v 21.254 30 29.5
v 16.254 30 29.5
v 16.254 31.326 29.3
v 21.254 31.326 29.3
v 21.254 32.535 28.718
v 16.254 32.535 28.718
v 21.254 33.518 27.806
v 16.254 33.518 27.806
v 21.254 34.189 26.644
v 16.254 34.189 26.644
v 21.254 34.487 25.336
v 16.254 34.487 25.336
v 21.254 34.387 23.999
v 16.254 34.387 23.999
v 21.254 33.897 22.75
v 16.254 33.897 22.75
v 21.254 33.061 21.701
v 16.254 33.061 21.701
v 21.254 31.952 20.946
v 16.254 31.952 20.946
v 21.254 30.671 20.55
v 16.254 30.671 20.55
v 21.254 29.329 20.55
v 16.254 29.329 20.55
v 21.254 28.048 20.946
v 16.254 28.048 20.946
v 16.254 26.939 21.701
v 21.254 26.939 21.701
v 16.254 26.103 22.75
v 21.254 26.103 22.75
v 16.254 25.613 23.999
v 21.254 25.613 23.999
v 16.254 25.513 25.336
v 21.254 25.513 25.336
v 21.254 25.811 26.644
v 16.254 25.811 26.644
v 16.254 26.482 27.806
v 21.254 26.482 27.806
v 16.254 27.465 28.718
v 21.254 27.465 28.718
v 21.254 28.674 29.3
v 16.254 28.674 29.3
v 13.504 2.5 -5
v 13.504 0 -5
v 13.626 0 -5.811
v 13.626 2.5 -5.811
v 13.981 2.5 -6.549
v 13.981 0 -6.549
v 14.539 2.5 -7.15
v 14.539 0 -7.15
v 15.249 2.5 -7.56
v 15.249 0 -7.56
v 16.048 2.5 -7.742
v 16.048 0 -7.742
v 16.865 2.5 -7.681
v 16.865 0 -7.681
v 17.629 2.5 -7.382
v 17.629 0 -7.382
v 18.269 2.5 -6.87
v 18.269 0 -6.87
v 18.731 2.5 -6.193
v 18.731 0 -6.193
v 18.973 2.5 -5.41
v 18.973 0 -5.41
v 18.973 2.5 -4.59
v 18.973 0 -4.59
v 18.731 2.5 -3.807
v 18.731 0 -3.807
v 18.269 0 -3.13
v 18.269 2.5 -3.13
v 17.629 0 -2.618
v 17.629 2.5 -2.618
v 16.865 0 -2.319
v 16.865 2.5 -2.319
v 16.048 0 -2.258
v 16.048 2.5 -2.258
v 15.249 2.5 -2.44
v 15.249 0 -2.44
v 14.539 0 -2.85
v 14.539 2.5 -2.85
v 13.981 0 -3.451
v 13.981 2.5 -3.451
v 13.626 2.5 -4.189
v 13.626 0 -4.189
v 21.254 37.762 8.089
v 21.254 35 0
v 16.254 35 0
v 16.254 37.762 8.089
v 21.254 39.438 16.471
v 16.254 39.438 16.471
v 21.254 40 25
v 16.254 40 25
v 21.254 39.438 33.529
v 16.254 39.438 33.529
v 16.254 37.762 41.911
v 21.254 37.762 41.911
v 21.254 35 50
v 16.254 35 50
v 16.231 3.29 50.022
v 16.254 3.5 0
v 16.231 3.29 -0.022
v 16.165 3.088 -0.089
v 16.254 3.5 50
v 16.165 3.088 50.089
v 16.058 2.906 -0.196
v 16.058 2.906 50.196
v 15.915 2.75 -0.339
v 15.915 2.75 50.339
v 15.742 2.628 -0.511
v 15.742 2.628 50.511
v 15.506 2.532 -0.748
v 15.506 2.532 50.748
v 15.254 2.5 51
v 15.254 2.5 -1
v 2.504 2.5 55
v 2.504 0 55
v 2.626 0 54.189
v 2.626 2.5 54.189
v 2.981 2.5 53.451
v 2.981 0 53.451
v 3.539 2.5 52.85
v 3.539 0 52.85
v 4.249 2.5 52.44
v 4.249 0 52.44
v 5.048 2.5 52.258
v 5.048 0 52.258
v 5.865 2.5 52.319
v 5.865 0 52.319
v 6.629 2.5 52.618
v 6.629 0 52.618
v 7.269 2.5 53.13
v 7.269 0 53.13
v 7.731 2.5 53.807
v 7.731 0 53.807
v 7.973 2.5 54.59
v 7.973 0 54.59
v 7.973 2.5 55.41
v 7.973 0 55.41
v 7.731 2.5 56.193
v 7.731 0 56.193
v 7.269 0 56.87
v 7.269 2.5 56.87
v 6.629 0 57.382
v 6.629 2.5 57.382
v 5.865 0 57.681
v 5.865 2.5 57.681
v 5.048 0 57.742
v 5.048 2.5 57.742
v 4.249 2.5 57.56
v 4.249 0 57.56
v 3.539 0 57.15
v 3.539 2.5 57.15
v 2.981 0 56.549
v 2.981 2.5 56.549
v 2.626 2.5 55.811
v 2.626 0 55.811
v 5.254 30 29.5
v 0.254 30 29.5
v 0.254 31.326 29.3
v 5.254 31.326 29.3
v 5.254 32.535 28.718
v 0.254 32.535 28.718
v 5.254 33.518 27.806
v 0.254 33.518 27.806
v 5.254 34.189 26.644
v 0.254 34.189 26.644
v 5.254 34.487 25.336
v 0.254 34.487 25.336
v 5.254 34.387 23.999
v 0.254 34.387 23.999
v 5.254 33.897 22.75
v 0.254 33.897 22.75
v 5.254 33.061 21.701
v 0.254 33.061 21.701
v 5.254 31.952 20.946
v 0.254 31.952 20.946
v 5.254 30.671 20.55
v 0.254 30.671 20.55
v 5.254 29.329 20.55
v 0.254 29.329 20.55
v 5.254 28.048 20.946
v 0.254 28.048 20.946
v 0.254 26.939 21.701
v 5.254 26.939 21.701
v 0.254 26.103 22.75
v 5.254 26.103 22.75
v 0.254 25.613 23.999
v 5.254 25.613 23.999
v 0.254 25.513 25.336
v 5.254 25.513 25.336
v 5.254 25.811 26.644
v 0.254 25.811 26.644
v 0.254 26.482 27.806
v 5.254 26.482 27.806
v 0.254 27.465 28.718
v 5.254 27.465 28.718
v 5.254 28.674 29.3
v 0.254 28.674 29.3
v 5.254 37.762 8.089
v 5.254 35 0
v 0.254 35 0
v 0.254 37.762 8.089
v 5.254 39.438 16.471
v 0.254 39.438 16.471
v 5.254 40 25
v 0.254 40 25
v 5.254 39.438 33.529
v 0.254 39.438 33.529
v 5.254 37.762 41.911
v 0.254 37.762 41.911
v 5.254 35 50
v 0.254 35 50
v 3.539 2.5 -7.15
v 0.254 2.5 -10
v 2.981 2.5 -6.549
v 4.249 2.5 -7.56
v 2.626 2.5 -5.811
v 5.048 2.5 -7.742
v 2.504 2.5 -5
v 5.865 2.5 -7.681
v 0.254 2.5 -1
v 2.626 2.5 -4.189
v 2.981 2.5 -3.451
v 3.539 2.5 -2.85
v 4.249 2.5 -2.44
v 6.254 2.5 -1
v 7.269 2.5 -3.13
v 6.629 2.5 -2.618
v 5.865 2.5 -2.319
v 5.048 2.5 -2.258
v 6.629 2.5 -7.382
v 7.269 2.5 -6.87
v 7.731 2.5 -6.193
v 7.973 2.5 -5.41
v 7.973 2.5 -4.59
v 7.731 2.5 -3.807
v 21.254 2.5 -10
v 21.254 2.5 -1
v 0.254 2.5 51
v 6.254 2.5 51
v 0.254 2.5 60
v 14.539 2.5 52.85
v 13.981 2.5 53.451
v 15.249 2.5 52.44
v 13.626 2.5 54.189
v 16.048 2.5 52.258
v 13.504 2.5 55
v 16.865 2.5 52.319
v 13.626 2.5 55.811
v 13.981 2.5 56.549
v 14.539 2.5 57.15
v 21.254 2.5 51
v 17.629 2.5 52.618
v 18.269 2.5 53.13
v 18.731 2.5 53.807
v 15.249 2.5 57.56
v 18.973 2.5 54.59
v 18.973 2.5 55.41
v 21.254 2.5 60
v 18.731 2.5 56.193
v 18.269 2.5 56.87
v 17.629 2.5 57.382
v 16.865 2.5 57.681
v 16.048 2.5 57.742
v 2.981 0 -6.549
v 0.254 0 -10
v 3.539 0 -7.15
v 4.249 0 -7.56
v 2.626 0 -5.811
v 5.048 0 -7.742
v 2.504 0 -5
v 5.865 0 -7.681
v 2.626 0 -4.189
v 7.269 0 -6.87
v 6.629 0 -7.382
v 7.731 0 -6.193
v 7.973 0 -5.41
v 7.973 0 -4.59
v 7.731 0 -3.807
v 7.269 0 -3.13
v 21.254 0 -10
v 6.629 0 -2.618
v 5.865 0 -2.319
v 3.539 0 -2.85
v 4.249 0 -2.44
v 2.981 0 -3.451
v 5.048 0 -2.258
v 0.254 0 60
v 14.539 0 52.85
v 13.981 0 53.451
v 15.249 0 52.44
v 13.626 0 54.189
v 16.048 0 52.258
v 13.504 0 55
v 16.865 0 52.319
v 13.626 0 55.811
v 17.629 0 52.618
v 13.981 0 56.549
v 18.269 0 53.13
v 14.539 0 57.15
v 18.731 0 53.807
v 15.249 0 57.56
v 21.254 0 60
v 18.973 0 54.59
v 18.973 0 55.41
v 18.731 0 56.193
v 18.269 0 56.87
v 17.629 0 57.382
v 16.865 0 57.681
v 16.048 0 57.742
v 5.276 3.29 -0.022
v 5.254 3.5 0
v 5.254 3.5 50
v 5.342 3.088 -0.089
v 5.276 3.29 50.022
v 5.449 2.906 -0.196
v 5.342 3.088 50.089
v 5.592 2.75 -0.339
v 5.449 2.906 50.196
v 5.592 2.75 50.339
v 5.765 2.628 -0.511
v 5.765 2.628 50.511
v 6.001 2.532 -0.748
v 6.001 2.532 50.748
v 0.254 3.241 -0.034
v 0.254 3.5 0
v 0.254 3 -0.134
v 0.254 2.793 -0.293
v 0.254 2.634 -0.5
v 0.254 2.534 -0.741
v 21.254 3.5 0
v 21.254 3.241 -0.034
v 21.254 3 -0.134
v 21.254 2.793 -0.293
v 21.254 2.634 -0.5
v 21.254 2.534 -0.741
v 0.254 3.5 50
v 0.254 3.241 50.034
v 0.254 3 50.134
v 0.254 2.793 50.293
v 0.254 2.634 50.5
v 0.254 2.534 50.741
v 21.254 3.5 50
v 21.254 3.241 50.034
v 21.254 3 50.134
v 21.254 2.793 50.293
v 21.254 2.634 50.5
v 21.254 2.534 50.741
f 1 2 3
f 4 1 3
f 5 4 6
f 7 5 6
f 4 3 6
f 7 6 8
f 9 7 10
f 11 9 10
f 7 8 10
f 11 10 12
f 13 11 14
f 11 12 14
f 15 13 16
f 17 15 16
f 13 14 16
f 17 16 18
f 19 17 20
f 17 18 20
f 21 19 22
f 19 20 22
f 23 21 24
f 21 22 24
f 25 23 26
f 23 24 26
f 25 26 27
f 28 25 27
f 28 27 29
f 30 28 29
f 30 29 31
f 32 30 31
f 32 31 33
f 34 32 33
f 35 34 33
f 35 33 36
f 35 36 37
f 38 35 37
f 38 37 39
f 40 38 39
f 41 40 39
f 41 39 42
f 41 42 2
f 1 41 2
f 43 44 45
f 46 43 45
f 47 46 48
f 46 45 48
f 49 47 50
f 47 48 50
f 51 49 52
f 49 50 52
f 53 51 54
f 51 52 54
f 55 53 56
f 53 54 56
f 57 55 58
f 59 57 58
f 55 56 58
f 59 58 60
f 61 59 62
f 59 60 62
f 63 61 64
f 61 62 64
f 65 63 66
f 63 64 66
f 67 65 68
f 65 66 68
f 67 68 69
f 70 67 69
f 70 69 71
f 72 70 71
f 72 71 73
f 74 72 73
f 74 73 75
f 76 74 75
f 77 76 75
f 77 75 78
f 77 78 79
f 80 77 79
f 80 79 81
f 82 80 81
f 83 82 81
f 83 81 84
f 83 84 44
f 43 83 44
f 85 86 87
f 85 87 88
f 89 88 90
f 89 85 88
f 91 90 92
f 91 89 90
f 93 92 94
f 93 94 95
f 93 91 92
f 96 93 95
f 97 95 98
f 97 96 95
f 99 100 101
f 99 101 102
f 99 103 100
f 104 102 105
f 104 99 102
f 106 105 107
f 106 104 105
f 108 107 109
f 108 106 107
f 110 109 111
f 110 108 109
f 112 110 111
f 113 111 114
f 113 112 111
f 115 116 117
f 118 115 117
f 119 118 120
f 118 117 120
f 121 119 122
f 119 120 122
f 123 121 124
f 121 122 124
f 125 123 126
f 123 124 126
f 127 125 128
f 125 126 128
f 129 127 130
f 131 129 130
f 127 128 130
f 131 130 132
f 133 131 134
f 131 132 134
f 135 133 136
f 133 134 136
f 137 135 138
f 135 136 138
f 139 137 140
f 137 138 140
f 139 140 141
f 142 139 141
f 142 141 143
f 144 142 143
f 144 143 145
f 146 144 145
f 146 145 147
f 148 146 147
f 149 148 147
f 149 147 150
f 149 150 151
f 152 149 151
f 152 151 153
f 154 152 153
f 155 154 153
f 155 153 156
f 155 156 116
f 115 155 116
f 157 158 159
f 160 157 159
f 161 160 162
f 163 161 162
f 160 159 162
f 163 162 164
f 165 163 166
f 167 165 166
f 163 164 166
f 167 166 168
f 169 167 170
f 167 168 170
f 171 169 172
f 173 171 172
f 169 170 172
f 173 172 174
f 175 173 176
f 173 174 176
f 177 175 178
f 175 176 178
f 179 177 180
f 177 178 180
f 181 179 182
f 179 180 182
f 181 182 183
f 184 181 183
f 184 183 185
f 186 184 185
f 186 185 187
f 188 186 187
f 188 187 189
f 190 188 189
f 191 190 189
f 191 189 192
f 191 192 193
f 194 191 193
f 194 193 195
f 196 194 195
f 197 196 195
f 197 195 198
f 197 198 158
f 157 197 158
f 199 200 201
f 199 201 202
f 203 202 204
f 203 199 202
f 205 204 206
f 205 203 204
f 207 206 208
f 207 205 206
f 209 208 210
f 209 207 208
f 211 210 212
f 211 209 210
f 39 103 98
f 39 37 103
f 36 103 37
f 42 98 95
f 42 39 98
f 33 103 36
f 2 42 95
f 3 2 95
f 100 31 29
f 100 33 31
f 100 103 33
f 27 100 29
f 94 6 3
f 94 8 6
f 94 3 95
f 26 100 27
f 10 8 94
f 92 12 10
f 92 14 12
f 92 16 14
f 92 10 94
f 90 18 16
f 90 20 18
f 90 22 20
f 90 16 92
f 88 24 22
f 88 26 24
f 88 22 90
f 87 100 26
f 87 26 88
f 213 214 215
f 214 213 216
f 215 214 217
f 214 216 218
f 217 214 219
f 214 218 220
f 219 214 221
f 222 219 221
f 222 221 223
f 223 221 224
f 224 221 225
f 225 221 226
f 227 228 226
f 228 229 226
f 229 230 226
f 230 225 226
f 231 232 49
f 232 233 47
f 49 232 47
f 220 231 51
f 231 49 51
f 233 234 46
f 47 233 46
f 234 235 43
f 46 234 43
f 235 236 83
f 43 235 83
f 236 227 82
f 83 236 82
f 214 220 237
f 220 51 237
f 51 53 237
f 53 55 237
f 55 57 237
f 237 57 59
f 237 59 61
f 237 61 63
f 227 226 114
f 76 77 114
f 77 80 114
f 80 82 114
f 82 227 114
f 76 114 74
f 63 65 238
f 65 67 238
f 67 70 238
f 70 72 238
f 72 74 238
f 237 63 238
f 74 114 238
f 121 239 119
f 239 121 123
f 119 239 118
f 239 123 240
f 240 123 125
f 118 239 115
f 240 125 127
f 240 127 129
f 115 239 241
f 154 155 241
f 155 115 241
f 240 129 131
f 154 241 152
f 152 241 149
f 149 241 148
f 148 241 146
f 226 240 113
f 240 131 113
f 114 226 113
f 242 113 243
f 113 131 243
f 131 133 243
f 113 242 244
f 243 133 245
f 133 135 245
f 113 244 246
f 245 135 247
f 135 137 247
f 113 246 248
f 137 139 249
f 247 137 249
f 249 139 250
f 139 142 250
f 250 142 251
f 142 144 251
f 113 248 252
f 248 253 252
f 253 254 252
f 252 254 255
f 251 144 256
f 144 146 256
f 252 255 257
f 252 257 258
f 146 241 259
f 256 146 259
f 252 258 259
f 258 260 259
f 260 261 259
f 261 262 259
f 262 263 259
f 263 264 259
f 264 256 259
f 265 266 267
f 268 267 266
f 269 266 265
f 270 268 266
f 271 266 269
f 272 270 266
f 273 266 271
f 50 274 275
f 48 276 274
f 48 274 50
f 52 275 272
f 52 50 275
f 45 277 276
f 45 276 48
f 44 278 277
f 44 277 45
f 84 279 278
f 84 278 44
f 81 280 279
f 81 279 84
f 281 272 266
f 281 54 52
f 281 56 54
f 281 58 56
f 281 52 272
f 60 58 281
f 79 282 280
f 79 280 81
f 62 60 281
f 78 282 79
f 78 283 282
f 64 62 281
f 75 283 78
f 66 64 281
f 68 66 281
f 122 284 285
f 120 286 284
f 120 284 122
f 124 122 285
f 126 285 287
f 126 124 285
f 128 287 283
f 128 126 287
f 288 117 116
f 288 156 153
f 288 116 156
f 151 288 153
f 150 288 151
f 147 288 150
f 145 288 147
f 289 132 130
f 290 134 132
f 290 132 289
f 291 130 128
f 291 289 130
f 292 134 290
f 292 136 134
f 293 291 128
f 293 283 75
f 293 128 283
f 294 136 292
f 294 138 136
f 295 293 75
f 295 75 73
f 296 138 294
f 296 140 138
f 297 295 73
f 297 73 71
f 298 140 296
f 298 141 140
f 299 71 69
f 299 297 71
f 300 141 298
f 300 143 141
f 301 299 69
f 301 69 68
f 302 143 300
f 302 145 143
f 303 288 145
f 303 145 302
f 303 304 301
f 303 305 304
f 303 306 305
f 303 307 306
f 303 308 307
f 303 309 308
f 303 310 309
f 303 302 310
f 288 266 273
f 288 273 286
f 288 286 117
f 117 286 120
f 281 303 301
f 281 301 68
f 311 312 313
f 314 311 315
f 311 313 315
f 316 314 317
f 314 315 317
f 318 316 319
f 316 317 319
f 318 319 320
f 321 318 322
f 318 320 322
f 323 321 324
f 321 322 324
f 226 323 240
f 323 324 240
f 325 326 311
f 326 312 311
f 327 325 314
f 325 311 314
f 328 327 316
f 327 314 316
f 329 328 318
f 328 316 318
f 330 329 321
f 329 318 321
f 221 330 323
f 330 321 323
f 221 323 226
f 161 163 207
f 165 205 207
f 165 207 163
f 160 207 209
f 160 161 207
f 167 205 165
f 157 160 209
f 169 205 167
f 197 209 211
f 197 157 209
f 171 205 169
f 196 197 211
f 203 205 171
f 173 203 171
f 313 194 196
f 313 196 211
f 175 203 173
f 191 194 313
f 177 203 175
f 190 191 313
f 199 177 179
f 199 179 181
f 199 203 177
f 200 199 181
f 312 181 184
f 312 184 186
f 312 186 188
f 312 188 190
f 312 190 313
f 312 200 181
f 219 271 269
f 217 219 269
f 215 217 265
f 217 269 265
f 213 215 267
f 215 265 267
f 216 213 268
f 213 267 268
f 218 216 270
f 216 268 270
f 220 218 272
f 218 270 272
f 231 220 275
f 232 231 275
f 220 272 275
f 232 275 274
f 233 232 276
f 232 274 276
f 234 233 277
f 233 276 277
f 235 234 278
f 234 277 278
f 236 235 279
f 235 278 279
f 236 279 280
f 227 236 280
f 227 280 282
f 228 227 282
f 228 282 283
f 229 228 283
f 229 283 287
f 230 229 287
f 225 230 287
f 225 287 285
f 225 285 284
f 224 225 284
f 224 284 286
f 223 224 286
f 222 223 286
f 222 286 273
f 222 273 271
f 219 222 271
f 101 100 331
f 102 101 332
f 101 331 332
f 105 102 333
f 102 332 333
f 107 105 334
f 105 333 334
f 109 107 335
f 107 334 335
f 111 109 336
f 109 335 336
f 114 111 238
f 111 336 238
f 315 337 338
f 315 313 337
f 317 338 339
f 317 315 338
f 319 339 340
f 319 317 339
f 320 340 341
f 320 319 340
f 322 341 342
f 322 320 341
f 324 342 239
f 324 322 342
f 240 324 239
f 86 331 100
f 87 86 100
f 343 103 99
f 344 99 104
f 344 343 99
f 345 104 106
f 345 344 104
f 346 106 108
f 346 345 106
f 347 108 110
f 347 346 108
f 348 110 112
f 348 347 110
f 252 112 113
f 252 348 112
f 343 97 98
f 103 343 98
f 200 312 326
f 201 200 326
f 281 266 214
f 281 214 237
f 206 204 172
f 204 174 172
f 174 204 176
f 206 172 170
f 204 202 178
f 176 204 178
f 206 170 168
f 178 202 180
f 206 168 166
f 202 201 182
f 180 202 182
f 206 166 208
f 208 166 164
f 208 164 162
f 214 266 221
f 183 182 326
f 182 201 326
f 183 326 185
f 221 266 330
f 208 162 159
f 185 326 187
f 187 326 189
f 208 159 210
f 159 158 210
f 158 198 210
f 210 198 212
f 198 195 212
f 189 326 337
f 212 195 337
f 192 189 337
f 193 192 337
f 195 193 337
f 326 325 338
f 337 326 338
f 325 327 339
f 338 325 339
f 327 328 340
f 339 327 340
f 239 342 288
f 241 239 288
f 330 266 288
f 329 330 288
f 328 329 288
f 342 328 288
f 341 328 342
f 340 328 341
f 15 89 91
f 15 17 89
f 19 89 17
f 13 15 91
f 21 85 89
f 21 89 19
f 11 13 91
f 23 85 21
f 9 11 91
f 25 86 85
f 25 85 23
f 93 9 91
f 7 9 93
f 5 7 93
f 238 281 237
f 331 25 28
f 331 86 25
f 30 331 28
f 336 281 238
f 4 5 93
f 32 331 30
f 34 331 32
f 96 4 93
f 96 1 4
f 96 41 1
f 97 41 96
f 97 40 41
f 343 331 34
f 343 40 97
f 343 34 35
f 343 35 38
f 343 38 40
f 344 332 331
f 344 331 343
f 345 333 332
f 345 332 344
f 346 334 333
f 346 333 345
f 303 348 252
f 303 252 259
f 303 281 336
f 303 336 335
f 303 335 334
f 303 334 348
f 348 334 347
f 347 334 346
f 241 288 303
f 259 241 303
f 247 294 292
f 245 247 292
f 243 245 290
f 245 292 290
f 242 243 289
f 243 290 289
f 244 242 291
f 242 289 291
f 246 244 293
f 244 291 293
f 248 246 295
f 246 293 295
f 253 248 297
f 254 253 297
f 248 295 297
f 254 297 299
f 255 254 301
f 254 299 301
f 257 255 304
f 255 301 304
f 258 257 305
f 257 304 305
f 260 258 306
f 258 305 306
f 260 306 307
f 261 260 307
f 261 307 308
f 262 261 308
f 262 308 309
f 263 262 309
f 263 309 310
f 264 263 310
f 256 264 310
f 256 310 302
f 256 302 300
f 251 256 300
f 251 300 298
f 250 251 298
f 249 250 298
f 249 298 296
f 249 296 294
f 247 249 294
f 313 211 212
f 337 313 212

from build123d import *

# Parameters (mm, degrees)
BOSS_EXTRUDE1_DEPTH      = 50
CUT_EXTRUDE1_DEPTH       = 22
M8_CLEARANCE_HOLE1_D     = 9
M8_CLEARANCE_HOLE1_DEPTH = 30
M8_CLEARANCE_HOLE1_TIP   = 2.703872786
SKETCH6_W                = 21
SKETCH6_H                = 10
BOSS_EXTRUDE2_DEPTH      = 2.5
FILLET1_R                = 1
M5_CLEARANCE_HOLE1_D     = 5.5


with BuildPart() as part:
    # Sketch1 → Boss-Extrude1 (new body)
    with BuildSketch(Plane.XY):
        Polygon((0.253520576, 50), (5.253520576, 50), (5.253520576, 2.5), (16.253520576, 2.5), (16.253520576, 50), (21.253520576, 50), (21.253520576, 0), (0.253520576, 0), align=None)
    extrude(amount=BOSS_EXTRUDE1_DEPTH)

    # Sketch2 → Cut-Extrude1 (cut, through all)
    with BuildSketch(Plane(origin=(21.253520576, 0, 0), x_dir=(0, 0, -1), z_dir=(1, 0, 0))):
        with BuildLine():
            Line((-50, 35), (-50, 50))
            Line((-50, 50), (0, 50))
            Line((0, 50), (0, 35))
            ThreePointArc((0, 35), (-25, 40), (-50, 35))
        make_face()
    extrude(amount=-CUT_EXTRUDE1_DEPTH, mode=Mode.SUBTRACT)

    # M8 Clearance Hole1
    with Locations(Plane(origin=(21.253520576, 0, 0), x_dir=(0, 0, -1), z_dir=(1, 0, 0))):
        with Locations((-25, 30)):
            Hole(M8_CLEARANCE_HOLE1_D / 2, depth=M8_CLEARANCE_HOLE1_DEPTH)
            with Locations((0, 0, -(M8_CLEARANCE_HOLE1_DEPTH + M8_CLEARANCE_HOLE1_TIP / 2))):  # 118° drill point
                Cone(0, M8_CLEARANCE_HOLE1_D / 2, M8_CLEARANCE_HOLE1_TIP, mode=Mode.SUBTRACT)

    # Sketch6 → Boss-Extrude2 (add)
    with BuildSketch(Plane.XZ):
        with Locations((10.753520576, -5)):
            Rectangle(SKETCH6_W, SKETCH6_H)
        with Locations((10.753520576, 55)):
            Rectangle(SKETCH6_W, SKETCH6_H)
    extrude(amount=-BOSS_EXTRUDE2_DEPTH)

    # Fillet1
    fillet1_edges = [part.edges().sort_by_distance(p)[0] for p in [
        (5.253520576, 2.5, 25),
        (16.253520576, 2.5, 25),
        (2.753520576, 2.5, 0),
        (18.753520576, 2.5, 0),
        (18.753520576, 2.5, 50),
        (2.753520576, 2.5, 50),
    ]]
    fillet(fillet1_edges, radius=FILLET1_R)

    # M5 Clearance Hole1 (through all)
    with Locations(Plane(origin=(0, 2.5, 0), x_dir=(1, 0, 0), z_dir=(0, 1, 0))):
        with Locations((5.253520576, -55), (16.253520576, -55), (5.253520576, 5), (16.253520576, 5)):
            Hole(M5_CLEARANCE_HOLE1_D / 2)


solid = part.part
